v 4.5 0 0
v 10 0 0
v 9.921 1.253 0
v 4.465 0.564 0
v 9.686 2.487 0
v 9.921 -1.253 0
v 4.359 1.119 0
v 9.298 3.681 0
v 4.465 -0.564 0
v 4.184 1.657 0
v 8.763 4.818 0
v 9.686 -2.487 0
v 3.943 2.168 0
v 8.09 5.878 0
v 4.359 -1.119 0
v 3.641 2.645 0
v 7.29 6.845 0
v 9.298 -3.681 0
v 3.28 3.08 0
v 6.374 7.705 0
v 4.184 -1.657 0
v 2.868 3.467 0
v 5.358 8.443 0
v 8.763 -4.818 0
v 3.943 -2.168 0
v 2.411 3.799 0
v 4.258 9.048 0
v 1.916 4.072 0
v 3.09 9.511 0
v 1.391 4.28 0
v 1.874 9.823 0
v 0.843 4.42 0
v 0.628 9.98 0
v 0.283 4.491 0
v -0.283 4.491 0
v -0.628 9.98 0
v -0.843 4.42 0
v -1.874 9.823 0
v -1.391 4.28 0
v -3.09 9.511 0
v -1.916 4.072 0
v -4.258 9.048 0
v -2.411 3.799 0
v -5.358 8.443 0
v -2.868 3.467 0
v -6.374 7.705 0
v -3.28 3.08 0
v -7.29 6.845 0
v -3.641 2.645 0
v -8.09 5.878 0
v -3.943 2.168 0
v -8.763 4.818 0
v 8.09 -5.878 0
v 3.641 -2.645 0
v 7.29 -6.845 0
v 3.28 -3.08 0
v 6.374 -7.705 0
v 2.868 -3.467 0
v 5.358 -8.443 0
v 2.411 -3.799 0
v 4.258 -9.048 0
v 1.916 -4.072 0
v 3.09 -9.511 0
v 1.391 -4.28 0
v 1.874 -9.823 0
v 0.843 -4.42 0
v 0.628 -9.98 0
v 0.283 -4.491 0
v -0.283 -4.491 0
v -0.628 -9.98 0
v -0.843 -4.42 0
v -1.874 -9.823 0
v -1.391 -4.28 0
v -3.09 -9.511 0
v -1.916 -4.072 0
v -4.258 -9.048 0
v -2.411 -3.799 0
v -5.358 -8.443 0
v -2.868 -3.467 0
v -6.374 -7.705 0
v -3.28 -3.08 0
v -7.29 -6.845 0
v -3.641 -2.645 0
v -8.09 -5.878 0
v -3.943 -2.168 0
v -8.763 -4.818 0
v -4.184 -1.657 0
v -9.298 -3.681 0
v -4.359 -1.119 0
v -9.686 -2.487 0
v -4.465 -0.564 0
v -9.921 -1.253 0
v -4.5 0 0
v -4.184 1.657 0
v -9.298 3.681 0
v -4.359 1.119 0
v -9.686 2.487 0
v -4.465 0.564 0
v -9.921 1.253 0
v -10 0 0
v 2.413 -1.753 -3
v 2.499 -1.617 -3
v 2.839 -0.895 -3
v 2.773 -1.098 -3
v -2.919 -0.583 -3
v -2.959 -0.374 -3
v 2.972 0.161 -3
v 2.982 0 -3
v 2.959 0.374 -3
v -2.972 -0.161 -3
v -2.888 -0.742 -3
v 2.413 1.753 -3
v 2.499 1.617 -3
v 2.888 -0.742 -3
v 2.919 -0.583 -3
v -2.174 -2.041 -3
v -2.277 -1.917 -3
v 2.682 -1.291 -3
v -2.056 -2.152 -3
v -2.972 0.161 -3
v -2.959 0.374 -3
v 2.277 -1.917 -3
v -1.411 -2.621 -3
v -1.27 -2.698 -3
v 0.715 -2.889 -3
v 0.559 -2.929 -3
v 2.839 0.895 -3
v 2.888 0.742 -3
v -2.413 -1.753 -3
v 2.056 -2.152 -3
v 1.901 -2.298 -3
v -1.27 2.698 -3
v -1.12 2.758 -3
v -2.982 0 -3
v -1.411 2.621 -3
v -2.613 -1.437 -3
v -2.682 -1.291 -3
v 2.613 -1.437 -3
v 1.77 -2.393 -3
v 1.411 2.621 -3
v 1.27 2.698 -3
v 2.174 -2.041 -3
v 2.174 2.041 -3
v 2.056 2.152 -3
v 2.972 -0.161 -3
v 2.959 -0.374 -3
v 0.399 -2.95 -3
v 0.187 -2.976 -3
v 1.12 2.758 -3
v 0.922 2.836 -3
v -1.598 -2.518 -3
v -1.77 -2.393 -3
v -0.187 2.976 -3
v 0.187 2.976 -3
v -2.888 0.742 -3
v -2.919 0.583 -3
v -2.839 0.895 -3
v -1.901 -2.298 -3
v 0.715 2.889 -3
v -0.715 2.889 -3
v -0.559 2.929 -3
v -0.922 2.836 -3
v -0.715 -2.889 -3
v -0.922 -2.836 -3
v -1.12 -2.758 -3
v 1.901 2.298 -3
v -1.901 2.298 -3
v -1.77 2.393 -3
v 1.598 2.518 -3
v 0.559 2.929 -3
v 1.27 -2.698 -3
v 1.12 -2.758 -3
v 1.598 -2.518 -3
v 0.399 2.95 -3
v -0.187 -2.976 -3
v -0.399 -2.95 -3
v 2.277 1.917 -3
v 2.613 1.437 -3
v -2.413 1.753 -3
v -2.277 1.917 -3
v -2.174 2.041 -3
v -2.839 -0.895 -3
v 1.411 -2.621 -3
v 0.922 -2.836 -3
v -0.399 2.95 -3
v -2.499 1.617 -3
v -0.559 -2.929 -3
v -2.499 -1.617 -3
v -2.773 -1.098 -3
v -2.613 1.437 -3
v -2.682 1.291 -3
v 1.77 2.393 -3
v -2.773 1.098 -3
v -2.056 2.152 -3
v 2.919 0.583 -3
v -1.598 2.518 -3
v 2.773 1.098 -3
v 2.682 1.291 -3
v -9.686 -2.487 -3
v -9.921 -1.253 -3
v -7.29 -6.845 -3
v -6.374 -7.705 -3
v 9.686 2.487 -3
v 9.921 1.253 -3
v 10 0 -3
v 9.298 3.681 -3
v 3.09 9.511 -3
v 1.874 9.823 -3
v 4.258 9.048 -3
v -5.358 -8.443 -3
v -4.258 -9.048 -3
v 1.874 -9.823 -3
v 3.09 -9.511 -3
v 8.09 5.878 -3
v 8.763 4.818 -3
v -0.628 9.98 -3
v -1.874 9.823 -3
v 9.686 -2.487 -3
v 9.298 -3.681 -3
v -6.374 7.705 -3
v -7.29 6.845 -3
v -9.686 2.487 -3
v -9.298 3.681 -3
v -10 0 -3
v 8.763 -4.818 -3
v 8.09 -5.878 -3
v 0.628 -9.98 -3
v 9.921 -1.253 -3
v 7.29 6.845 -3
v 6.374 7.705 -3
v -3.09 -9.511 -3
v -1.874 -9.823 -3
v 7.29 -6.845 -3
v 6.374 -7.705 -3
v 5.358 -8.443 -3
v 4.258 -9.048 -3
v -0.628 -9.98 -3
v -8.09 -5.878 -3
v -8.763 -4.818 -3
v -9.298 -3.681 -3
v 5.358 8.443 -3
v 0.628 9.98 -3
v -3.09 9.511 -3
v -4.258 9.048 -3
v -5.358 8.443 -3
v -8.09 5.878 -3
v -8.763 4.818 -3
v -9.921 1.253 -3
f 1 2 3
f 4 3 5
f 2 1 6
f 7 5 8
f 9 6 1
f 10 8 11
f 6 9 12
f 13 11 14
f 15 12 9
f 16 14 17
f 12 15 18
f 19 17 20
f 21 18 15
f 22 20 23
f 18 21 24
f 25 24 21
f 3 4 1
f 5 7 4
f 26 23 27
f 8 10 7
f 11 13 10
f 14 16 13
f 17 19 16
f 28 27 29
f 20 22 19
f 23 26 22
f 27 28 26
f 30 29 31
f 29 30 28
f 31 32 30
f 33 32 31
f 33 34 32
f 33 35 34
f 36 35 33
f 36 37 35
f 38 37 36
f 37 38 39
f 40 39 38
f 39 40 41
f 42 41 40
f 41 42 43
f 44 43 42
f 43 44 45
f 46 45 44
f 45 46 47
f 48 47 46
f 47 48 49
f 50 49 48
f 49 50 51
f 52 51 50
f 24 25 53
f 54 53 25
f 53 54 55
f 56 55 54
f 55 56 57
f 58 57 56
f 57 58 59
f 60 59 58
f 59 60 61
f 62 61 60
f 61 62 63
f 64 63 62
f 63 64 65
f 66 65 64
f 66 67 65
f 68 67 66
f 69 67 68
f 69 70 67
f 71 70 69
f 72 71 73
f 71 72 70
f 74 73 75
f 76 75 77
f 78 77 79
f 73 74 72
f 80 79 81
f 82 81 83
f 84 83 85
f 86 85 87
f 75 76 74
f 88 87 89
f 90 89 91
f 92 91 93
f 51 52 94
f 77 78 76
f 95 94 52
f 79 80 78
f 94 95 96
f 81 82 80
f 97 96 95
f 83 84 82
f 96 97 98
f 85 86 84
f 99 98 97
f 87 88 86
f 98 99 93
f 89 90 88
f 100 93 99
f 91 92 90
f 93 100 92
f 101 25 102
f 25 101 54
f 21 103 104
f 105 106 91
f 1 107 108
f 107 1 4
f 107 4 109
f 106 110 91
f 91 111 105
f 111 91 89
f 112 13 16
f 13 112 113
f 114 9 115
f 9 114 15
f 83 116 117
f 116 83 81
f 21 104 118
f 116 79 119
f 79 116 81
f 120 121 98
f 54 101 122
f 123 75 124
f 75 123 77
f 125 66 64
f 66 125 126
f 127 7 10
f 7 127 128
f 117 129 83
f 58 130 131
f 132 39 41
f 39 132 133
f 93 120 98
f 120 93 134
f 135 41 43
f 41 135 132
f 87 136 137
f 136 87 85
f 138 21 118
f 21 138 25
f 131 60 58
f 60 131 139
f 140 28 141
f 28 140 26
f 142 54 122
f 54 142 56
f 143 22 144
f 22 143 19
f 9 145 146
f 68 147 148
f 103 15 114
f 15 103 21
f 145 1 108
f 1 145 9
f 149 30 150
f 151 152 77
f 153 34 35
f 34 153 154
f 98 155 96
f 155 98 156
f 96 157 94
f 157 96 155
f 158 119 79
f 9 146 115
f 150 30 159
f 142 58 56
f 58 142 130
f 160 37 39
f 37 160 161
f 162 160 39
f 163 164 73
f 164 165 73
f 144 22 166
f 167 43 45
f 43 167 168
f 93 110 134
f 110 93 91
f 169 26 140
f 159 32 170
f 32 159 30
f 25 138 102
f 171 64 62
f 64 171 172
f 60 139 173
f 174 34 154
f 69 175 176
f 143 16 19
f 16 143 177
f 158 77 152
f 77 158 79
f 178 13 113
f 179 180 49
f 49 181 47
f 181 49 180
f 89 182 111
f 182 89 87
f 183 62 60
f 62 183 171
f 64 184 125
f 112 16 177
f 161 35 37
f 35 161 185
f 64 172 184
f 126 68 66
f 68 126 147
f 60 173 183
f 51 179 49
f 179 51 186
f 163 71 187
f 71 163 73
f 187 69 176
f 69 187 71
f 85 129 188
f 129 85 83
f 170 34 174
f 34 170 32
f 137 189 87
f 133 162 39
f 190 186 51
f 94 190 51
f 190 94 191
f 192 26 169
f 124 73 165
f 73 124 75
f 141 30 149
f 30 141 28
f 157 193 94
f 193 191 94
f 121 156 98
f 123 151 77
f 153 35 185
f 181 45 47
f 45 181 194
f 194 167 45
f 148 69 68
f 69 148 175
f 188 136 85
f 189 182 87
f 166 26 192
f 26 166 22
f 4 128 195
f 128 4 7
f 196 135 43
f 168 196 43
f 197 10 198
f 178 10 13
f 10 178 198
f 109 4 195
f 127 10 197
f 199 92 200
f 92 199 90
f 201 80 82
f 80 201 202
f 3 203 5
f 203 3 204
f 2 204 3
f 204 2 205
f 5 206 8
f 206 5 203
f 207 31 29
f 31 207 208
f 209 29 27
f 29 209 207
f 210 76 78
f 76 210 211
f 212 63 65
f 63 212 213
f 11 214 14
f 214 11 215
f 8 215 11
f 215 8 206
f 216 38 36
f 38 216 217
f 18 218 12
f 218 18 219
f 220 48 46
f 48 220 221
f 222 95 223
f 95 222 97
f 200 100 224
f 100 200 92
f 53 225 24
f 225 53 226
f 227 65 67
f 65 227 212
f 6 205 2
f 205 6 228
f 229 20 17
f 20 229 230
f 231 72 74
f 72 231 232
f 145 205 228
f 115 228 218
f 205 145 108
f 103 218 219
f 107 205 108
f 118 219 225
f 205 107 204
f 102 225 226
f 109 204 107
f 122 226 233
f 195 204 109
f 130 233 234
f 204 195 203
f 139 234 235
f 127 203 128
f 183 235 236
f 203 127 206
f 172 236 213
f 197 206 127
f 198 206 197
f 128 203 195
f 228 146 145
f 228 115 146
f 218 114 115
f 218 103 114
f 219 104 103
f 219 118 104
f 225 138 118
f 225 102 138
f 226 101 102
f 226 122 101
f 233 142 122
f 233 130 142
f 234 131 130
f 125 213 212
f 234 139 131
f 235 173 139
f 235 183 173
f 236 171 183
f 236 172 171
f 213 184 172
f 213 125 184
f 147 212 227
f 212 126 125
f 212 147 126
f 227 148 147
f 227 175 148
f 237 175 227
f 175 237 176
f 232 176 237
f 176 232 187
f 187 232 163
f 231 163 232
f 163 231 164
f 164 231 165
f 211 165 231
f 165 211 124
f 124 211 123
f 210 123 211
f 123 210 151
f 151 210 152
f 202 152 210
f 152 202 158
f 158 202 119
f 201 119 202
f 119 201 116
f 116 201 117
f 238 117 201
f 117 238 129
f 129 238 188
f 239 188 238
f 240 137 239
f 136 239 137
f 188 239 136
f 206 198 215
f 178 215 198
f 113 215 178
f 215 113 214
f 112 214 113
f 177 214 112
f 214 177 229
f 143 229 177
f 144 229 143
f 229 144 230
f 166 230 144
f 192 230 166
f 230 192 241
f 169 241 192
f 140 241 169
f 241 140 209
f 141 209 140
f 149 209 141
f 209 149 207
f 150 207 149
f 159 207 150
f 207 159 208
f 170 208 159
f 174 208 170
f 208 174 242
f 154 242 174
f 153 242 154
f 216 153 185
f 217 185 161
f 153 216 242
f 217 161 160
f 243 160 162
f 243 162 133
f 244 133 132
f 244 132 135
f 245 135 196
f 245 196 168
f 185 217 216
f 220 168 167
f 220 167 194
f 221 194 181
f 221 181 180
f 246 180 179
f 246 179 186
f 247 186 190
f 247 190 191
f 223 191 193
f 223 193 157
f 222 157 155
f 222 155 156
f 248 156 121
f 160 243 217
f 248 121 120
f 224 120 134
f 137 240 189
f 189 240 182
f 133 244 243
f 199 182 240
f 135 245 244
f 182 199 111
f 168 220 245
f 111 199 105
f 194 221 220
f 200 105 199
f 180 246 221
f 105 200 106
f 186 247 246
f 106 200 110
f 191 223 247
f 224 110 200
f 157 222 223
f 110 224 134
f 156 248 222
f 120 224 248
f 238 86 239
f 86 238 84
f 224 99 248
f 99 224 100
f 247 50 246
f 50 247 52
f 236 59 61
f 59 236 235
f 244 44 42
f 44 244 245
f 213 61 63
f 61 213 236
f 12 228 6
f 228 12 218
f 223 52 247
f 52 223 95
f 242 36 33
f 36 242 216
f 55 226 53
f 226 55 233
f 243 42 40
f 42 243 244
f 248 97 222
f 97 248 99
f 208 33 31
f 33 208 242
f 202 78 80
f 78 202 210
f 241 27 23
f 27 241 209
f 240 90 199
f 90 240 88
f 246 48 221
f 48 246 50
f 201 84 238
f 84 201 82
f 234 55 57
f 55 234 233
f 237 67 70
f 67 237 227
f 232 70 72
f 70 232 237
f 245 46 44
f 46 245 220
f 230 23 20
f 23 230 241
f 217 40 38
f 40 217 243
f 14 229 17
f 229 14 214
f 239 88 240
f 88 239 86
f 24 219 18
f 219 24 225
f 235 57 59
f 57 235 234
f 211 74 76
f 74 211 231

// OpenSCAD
$fn = 50;


difference() {
	union() {
		translate(v = [0, 0, -3.0000000000]) {
			cylinder(h = 3, r = 10.0000000000);
		}
	}
	union() {
		translate(v = [0, 0, 0]) {
			rotate(a = [0, 0, 0]) {
				difference() {
					union() {
						#translate(v = [0, 0, -3.0000000000]) {
							cylinder(h = 3, r = 2.2500000000);
						}
						#translate(v = [0, 0, -4.2000000000]) {
							cylinder(h = 4.2000000000, r = 10.0000000000, r1 = 2.3750000000, r2 = 4.5000000000);
						}
						#translate(v = [0, 0, -3.0000000000]) {
							cylinder(h = 3, r = 2.3750000000);
						}
						#translate(v = [0, 0, -3.0000000000]) {
							cylinder(h = 3, r = 2.2500000000);
						}
					}
					union();
				}
			}
		}
	}
}
